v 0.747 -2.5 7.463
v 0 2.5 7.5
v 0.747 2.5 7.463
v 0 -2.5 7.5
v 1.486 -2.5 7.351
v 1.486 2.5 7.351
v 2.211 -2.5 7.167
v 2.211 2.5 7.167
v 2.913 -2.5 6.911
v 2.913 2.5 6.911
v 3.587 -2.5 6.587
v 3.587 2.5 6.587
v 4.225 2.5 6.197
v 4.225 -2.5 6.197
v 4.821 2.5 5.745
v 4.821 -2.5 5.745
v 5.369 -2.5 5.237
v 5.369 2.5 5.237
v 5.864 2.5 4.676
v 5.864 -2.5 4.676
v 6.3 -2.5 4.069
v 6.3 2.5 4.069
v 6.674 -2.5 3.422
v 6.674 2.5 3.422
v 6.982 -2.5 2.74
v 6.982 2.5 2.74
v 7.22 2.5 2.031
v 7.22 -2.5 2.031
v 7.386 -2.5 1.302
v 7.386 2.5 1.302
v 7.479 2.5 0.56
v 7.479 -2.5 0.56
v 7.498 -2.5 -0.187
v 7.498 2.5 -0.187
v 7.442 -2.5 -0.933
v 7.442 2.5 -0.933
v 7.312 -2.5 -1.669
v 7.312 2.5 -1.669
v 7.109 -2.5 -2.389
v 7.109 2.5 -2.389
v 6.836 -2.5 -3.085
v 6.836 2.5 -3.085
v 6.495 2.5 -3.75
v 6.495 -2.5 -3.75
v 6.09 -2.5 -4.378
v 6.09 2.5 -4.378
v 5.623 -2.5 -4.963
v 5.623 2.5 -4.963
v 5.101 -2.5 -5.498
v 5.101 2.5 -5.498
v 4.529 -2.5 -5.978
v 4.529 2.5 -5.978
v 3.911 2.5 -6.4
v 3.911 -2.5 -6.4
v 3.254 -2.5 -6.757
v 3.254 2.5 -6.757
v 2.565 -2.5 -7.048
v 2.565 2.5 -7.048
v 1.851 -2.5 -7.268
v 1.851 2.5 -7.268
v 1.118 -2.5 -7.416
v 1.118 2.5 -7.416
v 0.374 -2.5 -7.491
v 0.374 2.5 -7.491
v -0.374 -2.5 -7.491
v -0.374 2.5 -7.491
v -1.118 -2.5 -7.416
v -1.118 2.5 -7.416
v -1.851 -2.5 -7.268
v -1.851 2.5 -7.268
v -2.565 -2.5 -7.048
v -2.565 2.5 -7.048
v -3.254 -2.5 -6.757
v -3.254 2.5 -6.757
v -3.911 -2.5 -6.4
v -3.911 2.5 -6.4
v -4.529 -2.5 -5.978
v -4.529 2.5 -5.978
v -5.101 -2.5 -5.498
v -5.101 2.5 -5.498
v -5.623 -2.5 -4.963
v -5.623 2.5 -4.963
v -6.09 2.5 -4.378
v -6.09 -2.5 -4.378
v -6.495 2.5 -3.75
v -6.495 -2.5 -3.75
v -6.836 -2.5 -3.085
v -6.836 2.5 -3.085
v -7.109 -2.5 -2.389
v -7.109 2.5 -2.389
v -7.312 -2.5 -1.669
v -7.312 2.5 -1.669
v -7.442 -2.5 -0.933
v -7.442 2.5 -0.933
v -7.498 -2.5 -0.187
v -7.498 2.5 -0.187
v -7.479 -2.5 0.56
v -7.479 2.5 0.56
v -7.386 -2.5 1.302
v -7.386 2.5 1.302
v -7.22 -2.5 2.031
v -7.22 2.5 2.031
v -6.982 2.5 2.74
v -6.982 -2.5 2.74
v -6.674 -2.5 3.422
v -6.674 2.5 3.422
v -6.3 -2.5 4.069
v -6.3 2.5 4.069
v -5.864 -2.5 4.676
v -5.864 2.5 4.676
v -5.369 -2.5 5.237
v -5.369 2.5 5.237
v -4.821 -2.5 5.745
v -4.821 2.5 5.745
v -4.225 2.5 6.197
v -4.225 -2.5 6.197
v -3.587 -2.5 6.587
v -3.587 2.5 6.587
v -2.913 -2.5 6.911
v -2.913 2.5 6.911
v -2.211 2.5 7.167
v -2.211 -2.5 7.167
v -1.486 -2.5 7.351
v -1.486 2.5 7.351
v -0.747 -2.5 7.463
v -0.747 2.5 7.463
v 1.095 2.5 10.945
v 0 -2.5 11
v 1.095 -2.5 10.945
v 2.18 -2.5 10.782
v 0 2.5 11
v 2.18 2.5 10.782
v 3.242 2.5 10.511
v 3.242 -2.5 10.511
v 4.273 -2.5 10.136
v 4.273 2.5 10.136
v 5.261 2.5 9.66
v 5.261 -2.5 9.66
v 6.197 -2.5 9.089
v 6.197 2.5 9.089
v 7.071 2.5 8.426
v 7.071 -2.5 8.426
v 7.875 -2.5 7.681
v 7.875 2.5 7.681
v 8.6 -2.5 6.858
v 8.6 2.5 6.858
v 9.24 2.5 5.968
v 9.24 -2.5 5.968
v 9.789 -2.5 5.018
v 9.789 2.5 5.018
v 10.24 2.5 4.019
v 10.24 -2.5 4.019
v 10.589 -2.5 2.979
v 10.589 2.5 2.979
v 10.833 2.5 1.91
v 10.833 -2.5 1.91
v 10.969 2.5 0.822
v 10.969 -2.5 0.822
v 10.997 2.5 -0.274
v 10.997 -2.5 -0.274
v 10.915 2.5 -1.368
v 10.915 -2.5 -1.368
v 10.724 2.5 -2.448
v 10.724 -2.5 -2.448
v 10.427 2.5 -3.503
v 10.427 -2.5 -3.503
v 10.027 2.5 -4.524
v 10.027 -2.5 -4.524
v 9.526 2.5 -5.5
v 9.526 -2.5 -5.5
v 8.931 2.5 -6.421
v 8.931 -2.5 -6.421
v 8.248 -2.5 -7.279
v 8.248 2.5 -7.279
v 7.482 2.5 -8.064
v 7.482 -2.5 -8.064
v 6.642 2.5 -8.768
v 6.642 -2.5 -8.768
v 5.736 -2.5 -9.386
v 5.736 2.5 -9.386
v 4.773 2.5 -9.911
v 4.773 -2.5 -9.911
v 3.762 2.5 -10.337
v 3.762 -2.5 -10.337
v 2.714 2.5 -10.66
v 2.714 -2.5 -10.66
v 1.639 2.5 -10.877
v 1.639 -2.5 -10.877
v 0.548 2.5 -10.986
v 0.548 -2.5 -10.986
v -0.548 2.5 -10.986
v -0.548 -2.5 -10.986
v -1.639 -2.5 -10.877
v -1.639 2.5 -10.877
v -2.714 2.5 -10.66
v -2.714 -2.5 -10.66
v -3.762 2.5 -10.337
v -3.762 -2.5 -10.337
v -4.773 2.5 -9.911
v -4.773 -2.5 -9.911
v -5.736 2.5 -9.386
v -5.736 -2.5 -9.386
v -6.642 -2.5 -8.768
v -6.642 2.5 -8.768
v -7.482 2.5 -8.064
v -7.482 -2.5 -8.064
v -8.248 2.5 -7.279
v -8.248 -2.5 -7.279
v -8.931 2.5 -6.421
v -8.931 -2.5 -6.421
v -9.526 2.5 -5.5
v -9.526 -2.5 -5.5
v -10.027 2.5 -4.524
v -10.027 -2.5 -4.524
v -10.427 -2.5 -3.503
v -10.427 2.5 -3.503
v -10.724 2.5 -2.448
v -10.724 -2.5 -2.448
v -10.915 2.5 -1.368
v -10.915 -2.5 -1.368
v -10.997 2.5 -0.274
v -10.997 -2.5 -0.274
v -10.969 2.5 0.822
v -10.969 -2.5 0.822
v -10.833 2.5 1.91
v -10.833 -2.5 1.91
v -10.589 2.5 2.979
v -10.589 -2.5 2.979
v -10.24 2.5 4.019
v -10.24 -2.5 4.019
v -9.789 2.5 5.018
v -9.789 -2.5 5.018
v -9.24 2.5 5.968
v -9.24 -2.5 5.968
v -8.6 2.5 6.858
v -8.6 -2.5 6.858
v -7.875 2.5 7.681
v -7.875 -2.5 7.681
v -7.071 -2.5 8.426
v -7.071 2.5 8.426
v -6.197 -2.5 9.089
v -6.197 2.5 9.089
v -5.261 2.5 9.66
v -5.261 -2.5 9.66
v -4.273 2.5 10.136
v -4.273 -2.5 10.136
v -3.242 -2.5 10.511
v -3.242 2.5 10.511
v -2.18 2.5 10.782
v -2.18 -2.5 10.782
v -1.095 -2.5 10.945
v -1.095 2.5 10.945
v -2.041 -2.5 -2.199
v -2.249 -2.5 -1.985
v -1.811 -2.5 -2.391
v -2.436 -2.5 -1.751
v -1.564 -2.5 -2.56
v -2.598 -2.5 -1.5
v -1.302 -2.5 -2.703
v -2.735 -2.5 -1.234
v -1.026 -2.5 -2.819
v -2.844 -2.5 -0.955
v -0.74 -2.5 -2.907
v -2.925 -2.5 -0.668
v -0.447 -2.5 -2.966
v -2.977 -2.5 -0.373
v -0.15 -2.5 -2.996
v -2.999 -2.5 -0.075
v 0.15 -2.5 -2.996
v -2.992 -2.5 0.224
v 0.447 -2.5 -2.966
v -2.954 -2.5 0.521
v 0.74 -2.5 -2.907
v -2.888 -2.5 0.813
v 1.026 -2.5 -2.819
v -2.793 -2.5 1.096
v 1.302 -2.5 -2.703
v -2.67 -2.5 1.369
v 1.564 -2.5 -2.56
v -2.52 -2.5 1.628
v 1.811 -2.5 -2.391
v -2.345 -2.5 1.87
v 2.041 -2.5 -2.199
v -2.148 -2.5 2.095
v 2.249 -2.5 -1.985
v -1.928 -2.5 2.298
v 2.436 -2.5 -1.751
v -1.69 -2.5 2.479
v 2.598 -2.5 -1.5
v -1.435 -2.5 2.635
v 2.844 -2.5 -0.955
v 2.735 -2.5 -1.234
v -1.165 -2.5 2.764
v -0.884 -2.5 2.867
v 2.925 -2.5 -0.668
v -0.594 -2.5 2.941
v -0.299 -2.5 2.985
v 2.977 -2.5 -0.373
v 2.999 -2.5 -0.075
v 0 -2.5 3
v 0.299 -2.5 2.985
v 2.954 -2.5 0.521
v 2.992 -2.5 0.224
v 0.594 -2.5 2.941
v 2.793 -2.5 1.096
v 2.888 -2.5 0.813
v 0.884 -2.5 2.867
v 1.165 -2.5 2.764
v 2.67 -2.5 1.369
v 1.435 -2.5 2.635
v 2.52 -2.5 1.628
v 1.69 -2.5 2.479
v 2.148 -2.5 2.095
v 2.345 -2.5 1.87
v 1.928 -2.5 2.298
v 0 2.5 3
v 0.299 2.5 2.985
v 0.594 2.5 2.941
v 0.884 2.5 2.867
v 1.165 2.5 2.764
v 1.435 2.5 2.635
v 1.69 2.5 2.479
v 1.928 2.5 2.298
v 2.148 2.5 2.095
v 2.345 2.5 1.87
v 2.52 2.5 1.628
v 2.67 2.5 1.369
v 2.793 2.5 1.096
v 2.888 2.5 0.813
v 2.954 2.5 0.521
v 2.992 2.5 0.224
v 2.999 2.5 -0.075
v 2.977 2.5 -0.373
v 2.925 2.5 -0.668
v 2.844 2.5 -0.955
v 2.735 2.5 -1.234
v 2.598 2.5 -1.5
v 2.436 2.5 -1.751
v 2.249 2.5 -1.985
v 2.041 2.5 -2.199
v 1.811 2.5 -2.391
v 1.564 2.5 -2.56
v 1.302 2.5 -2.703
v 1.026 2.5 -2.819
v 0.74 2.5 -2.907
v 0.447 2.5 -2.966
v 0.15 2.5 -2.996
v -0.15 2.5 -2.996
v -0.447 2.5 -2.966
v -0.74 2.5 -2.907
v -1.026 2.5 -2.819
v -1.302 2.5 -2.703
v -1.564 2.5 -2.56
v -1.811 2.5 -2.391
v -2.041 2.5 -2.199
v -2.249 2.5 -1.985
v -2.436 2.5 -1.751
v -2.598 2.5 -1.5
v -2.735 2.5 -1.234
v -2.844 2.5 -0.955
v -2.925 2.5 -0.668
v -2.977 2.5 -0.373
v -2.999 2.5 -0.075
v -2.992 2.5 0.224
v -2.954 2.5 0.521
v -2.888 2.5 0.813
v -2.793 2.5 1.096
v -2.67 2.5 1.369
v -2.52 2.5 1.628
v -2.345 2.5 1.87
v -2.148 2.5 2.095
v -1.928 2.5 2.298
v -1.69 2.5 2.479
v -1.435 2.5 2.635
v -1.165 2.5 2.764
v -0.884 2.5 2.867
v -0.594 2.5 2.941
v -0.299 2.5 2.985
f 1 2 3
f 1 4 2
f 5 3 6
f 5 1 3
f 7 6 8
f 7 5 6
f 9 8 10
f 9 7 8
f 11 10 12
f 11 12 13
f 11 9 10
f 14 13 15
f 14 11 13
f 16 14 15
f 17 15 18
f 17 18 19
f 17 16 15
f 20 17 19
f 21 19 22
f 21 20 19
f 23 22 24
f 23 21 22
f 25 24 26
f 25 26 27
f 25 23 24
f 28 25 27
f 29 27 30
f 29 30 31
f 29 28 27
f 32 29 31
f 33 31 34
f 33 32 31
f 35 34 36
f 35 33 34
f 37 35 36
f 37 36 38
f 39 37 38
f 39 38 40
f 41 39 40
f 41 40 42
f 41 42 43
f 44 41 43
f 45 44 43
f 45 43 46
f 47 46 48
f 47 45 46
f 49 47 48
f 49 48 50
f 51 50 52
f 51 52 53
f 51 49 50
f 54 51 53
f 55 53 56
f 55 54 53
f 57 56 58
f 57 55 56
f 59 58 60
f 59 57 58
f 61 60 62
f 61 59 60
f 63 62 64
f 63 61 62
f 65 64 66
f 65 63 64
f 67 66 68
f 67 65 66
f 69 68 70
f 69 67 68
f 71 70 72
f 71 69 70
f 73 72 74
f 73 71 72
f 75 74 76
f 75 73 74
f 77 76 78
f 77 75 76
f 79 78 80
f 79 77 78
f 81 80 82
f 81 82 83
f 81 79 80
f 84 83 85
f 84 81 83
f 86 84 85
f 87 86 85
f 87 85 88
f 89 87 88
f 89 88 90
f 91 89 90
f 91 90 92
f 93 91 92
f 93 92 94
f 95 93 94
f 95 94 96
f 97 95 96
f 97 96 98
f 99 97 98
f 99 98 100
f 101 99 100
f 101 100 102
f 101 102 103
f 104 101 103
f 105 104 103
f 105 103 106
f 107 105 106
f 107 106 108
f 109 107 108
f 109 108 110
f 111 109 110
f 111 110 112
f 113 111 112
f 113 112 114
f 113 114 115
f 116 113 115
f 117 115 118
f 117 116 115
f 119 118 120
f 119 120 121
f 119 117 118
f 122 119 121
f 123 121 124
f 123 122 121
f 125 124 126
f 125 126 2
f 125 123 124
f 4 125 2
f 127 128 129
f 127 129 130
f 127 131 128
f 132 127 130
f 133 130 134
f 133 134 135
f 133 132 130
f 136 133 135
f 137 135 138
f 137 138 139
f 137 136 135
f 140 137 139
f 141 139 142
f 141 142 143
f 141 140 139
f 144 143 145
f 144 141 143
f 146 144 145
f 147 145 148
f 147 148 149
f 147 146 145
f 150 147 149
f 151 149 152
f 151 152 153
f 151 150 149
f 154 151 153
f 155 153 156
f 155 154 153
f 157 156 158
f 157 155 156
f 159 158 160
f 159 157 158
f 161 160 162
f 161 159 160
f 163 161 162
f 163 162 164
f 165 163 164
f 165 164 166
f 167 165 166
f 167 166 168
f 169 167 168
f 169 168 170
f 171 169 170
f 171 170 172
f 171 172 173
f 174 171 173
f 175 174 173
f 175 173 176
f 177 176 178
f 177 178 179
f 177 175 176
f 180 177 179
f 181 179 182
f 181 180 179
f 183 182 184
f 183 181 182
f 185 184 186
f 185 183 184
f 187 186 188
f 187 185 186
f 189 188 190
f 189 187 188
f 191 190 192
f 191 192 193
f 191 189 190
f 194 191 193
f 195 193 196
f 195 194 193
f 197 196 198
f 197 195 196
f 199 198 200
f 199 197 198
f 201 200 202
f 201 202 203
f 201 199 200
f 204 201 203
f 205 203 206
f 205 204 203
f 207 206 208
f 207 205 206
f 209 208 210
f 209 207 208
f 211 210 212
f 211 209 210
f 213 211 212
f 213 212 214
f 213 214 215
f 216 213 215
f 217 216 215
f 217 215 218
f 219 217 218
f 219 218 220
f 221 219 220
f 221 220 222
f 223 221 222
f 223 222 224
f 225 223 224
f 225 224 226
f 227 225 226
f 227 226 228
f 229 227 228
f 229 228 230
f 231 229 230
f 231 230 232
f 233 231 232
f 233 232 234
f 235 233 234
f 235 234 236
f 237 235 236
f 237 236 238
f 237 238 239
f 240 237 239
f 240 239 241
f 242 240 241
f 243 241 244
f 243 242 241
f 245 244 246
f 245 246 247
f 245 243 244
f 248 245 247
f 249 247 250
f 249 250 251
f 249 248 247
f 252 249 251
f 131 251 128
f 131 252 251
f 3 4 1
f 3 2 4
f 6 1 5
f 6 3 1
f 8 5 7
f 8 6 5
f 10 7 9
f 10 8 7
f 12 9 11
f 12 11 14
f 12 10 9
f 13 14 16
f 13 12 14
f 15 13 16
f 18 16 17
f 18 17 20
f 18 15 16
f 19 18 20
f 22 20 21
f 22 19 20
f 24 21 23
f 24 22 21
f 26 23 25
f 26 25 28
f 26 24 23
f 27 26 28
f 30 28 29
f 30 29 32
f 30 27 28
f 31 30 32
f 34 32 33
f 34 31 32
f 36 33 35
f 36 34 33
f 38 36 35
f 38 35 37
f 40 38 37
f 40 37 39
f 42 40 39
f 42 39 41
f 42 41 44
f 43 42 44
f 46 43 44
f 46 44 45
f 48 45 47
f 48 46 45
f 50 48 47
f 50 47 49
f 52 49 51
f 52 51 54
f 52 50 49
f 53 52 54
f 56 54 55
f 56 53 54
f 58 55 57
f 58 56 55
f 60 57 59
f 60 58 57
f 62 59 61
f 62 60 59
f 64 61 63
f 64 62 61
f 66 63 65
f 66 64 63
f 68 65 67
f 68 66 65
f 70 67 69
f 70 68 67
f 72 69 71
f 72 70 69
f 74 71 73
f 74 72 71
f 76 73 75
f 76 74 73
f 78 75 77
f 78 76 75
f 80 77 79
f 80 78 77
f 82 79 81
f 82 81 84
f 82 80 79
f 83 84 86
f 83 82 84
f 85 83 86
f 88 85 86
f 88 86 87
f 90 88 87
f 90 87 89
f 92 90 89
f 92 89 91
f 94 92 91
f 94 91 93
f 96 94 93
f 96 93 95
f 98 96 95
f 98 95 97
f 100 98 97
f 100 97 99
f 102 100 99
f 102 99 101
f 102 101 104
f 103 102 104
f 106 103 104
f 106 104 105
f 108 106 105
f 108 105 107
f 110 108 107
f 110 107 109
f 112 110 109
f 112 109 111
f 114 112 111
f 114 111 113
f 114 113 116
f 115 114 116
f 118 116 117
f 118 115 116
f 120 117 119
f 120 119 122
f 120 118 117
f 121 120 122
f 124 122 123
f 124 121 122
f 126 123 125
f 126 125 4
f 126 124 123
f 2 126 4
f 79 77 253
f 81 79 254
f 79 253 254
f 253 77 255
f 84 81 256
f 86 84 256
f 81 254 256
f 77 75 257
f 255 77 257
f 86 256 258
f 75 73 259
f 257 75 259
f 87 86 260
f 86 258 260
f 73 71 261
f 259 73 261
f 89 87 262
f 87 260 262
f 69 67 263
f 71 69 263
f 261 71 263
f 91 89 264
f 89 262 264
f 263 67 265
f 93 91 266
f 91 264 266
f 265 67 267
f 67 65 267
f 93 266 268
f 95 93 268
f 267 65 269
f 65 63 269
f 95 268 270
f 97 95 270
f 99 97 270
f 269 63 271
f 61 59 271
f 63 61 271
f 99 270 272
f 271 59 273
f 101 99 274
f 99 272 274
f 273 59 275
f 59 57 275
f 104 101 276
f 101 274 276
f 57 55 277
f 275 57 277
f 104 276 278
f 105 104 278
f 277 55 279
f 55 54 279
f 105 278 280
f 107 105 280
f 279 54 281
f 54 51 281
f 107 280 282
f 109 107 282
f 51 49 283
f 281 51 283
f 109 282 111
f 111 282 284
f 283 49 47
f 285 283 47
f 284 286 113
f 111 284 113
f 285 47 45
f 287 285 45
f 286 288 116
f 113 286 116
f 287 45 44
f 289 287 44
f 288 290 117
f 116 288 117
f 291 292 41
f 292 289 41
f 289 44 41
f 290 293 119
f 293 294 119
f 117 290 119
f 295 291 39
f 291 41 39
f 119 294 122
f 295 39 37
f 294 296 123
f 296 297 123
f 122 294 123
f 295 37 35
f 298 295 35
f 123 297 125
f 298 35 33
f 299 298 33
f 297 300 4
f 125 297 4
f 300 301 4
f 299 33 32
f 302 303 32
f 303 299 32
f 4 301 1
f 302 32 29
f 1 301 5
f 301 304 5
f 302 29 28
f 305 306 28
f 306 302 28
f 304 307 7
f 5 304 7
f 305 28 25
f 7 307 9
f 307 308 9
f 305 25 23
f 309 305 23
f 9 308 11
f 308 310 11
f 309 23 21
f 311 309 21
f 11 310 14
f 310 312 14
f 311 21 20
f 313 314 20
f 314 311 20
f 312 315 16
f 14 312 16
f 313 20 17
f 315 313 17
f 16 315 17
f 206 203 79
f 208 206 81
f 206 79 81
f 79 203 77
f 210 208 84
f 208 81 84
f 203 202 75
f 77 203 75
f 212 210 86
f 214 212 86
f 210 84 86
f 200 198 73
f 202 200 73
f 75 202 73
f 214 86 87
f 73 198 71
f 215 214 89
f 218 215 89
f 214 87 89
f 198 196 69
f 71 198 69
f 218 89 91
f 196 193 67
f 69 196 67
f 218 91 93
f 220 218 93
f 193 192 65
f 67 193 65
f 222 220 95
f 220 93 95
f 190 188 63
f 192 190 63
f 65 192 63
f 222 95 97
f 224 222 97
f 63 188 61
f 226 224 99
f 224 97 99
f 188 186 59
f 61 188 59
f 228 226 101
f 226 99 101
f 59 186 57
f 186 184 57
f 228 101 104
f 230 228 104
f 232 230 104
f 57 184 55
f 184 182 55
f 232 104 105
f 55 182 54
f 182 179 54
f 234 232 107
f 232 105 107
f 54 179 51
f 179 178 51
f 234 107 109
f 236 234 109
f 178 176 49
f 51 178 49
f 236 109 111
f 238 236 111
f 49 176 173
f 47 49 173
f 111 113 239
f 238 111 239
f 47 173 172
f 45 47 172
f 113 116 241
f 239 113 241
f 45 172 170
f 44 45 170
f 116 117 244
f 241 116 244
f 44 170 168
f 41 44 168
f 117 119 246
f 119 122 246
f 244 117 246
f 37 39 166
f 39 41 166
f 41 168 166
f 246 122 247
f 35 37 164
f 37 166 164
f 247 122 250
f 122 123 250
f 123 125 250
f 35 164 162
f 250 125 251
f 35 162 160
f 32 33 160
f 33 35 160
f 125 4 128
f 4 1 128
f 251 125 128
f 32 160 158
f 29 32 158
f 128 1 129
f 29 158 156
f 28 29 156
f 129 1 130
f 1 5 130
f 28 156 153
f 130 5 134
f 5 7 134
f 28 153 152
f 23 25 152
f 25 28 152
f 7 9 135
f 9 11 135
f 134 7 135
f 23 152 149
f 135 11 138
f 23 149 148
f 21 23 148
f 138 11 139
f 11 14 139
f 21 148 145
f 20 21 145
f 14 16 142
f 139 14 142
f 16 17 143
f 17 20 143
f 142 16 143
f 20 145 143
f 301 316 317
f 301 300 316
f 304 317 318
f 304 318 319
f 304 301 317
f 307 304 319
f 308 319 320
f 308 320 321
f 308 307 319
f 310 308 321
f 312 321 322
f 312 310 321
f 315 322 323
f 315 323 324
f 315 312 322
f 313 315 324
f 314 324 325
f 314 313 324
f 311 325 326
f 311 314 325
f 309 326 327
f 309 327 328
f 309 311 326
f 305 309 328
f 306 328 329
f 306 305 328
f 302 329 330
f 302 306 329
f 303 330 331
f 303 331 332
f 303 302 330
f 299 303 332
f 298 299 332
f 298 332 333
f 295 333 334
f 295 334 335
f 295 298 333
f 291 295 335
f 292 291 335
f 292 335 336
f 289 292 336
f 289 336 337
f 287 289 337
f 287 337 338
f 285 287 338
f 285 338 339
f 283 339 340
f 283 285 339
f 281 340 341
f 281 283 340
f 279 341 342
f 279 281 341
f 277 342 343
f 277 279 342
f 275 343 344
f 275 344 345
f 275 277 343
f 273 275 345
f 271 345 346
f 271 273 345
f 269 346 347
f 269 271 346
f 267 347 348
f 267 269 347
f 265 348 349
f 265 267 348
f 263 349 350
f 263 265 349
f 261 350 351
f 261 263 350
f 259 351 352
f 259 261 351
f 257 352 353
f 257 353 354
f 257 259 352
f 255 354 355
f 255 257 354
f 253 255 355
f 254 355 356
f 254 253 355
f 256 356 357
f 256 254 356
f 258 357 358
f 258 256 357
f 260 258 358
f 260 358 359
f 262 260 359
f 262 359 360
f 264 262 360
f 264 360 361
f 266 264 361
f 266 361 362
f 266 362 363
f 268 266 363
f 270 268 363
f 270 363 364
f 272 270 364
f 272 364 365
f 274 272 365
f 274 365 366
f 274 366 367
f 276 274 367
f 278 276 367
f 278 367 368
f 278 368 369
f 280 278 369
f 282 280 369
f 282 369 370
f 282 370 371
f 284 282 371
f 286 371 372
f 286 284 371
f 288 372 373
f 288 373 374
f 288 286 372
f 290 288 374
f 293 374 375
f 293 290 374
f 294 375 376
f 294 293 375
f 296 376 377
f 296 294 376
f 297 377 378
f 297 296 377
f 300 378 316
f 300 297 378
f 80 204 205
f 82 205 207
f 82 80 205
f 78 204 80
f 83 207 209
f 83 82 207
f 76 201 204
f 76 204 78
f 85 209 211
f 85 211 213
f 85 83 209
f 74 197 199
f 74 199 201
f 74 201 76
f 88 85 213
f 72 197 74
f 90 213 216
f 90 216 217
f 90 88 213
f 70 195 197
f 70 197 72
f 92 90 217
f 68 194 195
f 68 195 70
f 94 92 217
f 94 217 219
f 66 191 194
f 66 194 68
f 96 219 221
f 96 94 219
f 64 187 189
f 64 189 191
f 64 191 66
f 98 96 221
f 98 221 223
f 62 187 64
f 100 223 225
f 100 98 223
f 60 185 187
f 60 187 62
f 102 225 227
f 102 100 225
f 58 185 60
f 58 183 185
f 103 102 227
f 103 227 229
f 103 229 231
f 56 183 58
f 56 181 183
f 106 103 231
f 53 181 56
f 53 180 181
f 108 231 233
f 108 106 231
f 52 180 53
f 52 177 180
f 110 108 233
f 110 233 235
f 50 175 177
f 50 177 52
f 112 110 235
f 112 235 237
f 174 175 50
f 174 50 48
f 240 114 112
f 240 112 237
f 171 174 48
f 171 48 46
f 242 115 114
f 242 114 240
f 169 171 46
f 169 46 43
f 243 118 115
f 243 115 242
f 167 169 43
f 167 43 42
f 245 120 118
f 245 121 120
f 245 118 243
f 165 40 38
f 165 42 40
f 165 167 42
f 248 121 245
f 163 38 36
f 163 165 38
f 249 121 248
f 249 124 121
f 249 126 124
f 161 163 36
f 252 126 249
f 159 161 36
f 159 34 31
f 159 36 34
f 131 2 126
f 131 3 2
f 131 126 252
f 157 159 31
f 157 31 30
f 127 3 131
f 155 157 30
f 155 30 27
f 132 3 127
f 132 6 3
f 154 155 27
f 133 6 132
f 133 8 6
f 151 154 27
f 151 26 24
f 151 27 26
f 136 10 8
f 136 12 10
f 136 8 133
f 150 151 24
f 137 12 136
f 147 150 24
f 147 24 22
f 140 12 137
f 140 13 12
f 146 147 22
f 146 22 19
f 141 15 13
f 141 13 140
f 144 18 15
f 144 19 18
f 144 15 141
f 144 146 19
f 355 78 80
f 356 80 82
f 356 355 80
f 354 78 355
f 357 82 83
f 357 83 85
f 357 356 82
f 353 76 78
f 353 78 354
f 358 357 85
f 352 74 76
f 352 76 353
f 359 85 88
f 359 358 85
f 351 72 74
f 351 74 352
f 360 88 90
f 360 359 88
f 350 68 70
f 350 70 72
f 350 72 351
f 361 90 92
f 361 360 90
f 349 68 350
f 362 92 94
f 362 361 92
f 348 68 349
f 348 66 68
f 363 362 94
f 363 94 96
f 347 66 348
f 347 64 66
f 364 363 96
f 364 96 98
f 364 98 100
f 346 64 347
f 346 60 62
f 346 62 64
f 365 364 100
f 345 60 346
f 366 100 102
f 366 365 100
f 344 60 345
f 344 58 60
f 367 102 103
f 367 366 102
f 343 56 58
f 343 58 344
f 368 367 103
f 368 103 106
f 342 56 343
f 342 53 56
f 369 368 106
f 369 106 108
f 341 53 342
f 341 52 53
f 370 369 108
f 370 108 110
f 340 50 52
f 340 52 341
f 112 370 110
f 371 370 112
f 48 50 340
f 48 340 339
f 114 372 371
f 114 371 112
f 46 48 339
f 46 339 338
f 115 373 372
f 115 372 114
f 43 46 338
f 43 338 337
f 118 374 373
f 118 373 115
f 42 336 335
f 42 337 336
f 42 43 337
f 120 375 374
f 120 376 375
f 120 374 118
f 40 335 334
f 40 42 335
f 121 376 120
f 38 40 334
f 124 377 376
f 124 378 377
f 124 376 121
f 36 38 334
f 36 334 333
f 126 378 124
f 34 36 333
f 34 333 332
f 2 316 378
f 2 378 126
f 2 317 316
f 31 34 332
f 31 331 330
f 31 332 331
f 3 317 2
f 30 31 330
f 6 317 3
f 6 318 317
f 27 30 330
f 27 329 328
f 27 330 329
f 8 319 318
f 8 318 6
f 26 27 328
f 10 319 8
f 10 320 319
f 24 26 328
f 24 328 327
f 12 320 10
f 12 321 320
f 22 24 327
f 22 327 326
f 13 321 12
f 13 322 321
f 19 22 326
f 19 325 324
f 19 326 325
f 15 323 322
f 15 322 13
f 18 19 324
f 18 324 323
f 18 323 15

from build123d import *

# Parameters (mm, degrees)
SKETCH_1_R      = 7.5
SKETCH_1_R_2    = 3
EXTRUDE_1_DEPTH = 2.5
SKETCH_2_R      = 11
SKETCH_2_R_2    = 7.5
EXTRUDE_2_DEPTH = 2.5


with BuildPart() as part:
    # 草图1 → 凸台-拉伸1 (new, symmetric)
    with BuildSketch(Plane(origin=(0, 0, 0), x_dir=(1, 0, 0), z_dir=(0, 1, 0))):
        with Locations(Location((0, 0, 0), (0, 0, 270))):
            Circle(SKETCH_1_R)
        with Locations(Location((0, 0, 0), (0, 0, 270))):
            Circle(SKETCH_1_R_2, mode=Mode.SUBTRACT)
    extrude(amount=EXTRUDE_1_DEPTH, both=True)


with BuildPart() as body_2:
    # 草图2 → 凸台-拉伸2 (new, symmetric)
    with BuildSketch(Plane(origin=(0, 0, 0), x_dir=(1, 0, 0), z_dir=(0, 1, 0))):
        with Locations(Location((0, 0, 0), (0, 0, 270))):
            Circle(SKETCH_2_R)
        with Locations(Location((0, 0, 0), (0, 0, 270))):
            Circle(SKETCH_2_R_2, mode=Mode.SUBTRACT)
    extrude(amount=EXTRUDE_2_DEPTH, both=True)


solid = Compound([part.part, body_2.part])
